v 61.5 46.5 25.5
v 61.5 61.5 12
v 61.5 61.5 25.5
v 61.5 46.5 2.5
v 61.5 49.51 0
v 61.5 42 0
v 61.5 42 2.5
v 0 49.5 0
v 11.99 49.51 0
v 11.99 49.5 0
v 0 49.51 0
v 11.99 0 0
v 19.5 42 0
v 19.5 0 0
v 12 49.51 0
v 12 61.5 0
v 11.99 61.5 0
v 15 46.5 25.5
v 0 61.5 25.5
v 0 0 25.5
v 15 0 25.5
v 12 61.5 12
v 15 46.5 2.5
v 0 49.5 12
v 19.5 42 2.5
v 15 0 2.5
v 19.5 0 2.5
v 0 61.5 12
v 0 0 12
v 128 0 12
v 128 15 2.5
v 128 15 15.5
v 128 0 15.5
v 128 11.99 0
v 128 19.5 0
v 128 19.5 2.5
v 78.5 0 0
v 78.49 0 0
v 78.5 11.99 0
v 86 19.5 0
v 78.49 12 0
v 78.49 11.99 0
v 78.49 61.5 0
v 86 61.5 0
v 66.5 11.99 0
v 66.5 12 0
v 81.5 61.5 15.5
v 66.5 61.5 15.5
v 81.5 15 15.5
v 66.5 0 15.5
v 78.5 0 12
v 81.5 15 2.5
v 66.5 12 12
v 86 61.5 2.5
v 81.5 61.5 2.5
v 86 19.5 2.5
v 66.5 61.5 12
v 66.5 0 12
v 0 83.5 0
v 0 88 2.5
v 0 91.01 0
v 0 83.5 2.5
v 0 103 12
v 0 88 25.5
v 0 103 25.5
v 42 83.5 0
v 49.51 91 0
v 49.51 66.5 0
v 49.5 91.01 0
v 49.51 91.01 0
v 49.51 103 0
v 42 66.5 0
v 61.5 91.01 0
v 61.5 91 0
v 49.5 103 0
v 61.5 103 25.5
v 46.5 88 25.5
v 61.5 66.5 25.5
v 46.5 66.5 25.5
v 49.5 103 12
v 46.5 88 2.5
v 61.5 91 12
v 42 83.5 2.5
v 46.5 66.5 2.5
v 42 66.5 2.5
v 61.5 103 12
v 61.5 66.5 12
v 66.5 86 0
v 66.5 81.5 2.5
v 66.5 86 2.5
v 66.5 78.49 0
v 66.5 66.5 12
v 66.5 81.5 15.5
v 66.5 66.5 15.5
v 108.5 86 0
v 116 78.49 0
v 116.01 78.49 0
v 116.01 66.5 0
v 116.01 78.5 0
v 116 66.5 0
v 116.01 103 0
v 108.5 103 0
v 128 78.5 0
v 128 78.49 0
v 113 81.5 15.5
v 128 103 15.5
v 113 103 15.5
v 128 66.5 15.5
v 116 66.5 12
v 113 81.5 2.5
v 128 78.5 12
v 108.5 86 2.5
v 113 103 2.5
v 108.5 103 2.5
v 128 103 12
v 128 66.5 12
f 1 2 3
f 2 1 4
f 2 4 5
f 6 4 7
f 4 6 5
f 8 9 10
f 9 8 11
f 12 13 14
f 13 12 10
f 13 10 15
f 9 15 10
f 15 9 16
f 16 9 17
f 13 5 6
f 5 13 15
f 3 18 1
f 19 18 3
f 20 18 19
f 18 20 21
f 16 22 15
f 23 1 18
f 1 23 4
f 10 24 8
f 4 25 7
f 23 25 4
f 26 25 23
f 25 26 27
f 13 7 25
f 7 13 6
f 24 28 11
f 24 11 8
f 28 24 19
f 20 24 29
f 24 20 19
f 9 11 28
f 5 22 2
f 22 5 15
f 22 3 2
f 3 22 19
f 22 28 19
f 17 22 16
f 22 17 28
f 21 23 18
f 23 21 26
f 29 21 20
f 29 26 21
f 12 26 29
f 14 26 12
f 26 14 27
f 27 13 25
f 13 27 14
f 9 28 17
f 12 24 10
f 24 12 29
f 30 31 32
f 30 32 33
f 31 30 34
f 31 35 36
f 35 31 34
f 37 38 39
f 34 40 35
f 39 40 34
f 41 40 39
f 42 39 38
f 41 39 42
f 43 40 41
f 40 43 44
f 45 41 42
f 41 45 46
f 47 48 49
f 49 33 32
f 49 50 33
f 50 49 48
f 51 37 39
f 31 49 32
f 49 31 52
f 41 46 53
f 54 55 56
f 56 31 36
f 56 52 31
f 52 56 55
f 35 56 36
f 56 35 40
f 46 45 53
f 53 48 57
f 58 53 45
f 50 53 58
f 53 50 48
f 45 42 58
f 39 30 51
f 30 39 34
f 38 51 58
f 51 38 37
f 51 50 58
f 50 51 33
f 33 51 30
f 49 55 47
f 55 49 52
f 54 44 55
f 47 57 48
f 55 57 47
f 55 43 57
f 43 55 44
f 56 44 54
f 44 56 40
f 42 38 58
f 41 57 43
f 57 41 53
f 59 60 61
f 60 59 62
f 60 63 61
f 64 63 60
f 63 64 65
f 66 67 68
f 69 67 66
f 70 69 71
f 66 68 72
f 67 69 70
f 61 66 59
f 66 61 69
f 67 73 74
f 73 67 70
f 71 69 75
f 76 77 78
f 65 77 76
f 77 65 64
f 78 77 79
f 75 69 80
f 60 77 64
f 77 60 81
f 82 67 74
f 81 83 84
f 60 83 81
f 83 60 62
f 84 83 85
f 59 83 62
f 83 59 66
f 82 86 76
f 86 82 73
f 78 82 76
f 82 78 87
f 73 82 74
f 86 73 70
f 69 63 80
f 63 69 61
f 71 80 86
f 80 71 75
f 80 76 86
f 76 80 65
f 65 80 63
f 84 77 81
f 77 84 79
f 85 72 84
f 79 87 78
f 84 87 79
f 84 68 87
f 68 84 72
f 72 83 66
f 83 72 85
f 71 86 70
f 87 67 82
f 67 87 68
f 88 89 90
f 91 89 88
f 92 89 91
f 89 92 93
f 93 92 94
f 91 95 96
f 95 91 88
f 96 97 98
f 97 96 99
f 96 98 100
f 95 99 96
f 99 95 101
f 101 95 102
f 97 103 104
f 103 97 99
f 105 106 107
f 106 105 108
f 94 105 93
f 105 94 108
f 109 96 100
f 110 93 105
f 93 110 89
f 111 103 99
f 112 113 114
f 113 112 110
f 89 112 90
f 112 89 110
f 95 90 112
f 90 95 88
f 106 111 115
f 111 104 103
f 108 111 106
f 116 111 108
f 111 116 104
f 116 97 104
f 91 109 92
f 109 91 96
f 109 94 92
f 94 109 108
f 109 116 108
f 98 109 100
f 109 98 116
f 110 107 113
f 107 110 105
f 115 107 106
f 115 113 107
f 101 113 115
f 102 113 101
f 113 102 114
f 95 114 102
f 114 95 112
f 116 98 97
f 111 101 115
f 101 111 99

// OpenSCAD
// file: params.scad
// ===========================================================================
//  Apache 4800 cyberdeck v2 - shared parameters (all mm)
//  Every part file includes this through parts.scad.
//  Values marked [CHECK] are defaults from the spec: measure the real part and
//  change them here, then run build.cmd again to re-export every STL.
// ===========================================================================

// ---- printer limits --------------------------------------------------------
bed_max    = 175;      // max footprint X and Y
height_max = 150;

// ---- case: Harbor Freight Apache 4800 ---------------------------------------
case_in      = [454, 327];  // interior at the rim (listed)
tray         = [444, 312];  // [CHECK] printed tray outline = floor at the very bottom
tray_r       = 20;          // [CHECK] inside corner radius
base_depth   = 115;         // [CHECK] floor to rim
lid_depth    = 44;          // [CHECK]
height_limit = 100;         // nothing in the base taller than this above the floor

// ---- floor tiles (3 x 2) -----------------------------------------------------
tile_cols = 3;
tile_rows = 2;
tile_t    = 4;
tile_gap  = 0.4;                       // total gap between neighbouring tiles
tile_sz   = [tray[0] / tile_cols, tray[1] / tile_rows];   // 148 x 156
vent_sz     = 15;
vent_pitch  = 25;
vent_margin = 8;                       // keep vents this far from tile edges
chamfer     = 0.5;                     // bottom-edge chamfer (elephant foot)

// ---- tile joints (dovetail tabs printed on the tiles - no loose keys) -------
tab_neck  = 10;      // width where the tab leaves its tile
tab_head  = 16;      // width at the tip (wider = locks)
tab_len   = 10;      // how far it reaches into the next tile
tab_clear = 0.2;     // gap around the tab in the socket (per side); raise if too tight

// ---- Velcro straps ------------------------------------------------------------
strap_w      = 22;   // slot length (20 mm strap + room)
strap_slot_t = 3.5;  // slot width
strap_groove = 1.6;  // groove depth under a floor for the strap (leaves >= 2.4 mm of floor)

// ---- layout (top view; origin = front-left of tray, X right, Y to hinge) ----
// [x0, y0, x1, y1]
hub_box    = [75,   6, 245,  56];
pi_box     = [75,  60, 245, 138];
power_box  = [75, 142, 245, 282];
switch_box = [2.5, 12.5, 72.5, 117.5];
signal_lane = [0, 286, tray[0], 298];
power_lane  = [0, 300, tray[0], 312];

// ---- the PC: Minisforum UM870 Slim (names still say k12 so nothing else breaks) ----
k12      = [130, 126.5, 50.4];    // listed (was GMKtec K12: 154 x 151 x 73.6)
k12_pos  = [266, 40];             // front-left corner on the tray (same spot as the K12)
// [CHECK] open air behind the PC: assumes it blows hot air out the back.
// Once the UM870 is here, check where its vents really are.
rear_air = [k12_pos[0], k12_pos[1] + k12[1], 420, 286];
plinth_margin = 8;
plinth_h      = 15;
plinth_rim    = 8;                // solid border: corner guides sit fully on it
hex_cell      = 10;               // across flats
hex_wall      = 2;
plinth_post_front_h = 20;         // above the honeycomb
plinth_post_rear_h  = 10;         // keep the rear exhaust clear (spec: <= 10)
plinth_post_leg     = 15;
plinth_post_t       = 3;
k12_clear           = 1;
plinth_box = [k12_pos[0] - plinth_margin, k12_pos[1] - plinth_margin,
              k12_pos[0] + k12[0] + plinth_margin, k12_pos[1] + k12[1] + plinth_margin];

// ---- USB hub (Vantisan) -----------------------------------------------------------
hub      = [161, 42, 25];        // measured
hub_fit  = 1;                    // clearance (total)
hub_wall_h       = 16;           // back/side walls above the floor
hub_front_wall_h = 8;            // [CHECK] low front wall: ports face up/front
hub_floor        = 4;
hub_cable_end    = "right";      // cable exit notch end: "right" (toward the PC) or "left"

// ---- Raspberry Pi 5 in CanaKit case ------------------------------------------------
pi_case   = [95, 65, 30];        // measured (height est.)
pi_fit    = 1;
pi_floor  = 4;
pi_guide_h  = 12;
pi_vent_gap = 15;                // open space between Pi and the cable cubby
cubby_wall_h = 15;

// ---- power bay ------------------------------------------------------------------
brick  = [150, 65, 35];          // [CHECK] PC 120 W brick (UM870: 19 V / 6.32 A) - measure it
strip  = [130, 60, 40];          // [CHECK] compact 3-outlet surge strip
power_floor  = 4;
power_wall_h = 30;               // above the floor
power_wall_t = 3;
brick_rib_h  = 4;                // air gap under the brick

// ---- network switch -----------------------------------------------------------------
switch_sz   = [65, 100, 25];     // [CHECK] (X = width, Y = length, ports at back)
switch_fit  = 1;
switch_floor  = 4;
switch_wall_h = 12;

// ---- cable lanes ---------------------------------------------------------------------
rib_h      = 10;
rib_t      = 2.4;
rib_foot_w = 8;
rib_foot_t = 2;
rib_y      = 299;                // centre line between the lanes
comb_w     = 20;                 // comb thickness along the lane

// ---- left-wall side panel -------------------------------------------------------------
panel      = [150, 60];
panel_outer_t = 4;
panel_inner_t = 3;
wall_cutout   = [135, 42];       // [CHECK] must sit inside the flat area of the wall
panel_y_center = 215;            // along the case wall (tray Y)
keystone_hole  = [14.5, 16.0];   // print keystone_test.stl first and adjust
keystone_relief = [17.5, 24];    // back-side pocket so the latch sees a thin plate
keystone_latch_t = 2.0;          // plate thickness where the keystone clips on
keystone_pitch = 19.5;
// Power entry: "iec" = snap-in C14 inlet (recommended - see README) or "slot" = cord slot
power_entry  = "iec";
iec_hole     = [27.5, 19.8];     // [CHECK] snap-in C14 inlet cutout
iec_relief   = [31, 24];
iec_latch_t  = 2.0;
cord_slot    = [25, 12];
m4_hole      = 4.3;
labels = ["LAN", "PC", "MIC", "AUD", "USB", "PWR"];
cover_clear  = 9;                // room in front of the plate for couplers/bolt heads

// ---- lid monitor clips (ViewSonic VA1655) ------------------------------------------------
monitor     = [359, 227];        // listed (spec value used; re-measure the width)
mon_thick   = 20;                // thick edge (measured)
mon_thin    = 10;                // thin edge (measured)
thick_edge  = "bottom";          // [CHECK] "bottom" = hinge side when the lid is open
foam_t      = 1.5;               // foam on every face touching the monitor
clip_wall_t = 3;
clip_lip    = 3;                 // overlap onto the bezel only
clip_lip_t  = 2.5;
clip_buttress = 12;              // VHB foot width outside the wall
clip_leg    = 45;                // leg length along the monitor edge, from the corner
clip_port_leg = 20;              // [CHECK] shorter leg along the RIGHT edge (port zone)

// ---- print settings reference (set these in the slicer) ---------------------------------
// 0.4 nozzle, 0.2 layers, 4 walls, 25-30% gyroid
// holes already include +0.3 mm
$fn = 48;
// main file
// All four lid monitor clips on one bed, upside-down (lip on the bed).
include <parts.scad>
lid_clips_plate();
